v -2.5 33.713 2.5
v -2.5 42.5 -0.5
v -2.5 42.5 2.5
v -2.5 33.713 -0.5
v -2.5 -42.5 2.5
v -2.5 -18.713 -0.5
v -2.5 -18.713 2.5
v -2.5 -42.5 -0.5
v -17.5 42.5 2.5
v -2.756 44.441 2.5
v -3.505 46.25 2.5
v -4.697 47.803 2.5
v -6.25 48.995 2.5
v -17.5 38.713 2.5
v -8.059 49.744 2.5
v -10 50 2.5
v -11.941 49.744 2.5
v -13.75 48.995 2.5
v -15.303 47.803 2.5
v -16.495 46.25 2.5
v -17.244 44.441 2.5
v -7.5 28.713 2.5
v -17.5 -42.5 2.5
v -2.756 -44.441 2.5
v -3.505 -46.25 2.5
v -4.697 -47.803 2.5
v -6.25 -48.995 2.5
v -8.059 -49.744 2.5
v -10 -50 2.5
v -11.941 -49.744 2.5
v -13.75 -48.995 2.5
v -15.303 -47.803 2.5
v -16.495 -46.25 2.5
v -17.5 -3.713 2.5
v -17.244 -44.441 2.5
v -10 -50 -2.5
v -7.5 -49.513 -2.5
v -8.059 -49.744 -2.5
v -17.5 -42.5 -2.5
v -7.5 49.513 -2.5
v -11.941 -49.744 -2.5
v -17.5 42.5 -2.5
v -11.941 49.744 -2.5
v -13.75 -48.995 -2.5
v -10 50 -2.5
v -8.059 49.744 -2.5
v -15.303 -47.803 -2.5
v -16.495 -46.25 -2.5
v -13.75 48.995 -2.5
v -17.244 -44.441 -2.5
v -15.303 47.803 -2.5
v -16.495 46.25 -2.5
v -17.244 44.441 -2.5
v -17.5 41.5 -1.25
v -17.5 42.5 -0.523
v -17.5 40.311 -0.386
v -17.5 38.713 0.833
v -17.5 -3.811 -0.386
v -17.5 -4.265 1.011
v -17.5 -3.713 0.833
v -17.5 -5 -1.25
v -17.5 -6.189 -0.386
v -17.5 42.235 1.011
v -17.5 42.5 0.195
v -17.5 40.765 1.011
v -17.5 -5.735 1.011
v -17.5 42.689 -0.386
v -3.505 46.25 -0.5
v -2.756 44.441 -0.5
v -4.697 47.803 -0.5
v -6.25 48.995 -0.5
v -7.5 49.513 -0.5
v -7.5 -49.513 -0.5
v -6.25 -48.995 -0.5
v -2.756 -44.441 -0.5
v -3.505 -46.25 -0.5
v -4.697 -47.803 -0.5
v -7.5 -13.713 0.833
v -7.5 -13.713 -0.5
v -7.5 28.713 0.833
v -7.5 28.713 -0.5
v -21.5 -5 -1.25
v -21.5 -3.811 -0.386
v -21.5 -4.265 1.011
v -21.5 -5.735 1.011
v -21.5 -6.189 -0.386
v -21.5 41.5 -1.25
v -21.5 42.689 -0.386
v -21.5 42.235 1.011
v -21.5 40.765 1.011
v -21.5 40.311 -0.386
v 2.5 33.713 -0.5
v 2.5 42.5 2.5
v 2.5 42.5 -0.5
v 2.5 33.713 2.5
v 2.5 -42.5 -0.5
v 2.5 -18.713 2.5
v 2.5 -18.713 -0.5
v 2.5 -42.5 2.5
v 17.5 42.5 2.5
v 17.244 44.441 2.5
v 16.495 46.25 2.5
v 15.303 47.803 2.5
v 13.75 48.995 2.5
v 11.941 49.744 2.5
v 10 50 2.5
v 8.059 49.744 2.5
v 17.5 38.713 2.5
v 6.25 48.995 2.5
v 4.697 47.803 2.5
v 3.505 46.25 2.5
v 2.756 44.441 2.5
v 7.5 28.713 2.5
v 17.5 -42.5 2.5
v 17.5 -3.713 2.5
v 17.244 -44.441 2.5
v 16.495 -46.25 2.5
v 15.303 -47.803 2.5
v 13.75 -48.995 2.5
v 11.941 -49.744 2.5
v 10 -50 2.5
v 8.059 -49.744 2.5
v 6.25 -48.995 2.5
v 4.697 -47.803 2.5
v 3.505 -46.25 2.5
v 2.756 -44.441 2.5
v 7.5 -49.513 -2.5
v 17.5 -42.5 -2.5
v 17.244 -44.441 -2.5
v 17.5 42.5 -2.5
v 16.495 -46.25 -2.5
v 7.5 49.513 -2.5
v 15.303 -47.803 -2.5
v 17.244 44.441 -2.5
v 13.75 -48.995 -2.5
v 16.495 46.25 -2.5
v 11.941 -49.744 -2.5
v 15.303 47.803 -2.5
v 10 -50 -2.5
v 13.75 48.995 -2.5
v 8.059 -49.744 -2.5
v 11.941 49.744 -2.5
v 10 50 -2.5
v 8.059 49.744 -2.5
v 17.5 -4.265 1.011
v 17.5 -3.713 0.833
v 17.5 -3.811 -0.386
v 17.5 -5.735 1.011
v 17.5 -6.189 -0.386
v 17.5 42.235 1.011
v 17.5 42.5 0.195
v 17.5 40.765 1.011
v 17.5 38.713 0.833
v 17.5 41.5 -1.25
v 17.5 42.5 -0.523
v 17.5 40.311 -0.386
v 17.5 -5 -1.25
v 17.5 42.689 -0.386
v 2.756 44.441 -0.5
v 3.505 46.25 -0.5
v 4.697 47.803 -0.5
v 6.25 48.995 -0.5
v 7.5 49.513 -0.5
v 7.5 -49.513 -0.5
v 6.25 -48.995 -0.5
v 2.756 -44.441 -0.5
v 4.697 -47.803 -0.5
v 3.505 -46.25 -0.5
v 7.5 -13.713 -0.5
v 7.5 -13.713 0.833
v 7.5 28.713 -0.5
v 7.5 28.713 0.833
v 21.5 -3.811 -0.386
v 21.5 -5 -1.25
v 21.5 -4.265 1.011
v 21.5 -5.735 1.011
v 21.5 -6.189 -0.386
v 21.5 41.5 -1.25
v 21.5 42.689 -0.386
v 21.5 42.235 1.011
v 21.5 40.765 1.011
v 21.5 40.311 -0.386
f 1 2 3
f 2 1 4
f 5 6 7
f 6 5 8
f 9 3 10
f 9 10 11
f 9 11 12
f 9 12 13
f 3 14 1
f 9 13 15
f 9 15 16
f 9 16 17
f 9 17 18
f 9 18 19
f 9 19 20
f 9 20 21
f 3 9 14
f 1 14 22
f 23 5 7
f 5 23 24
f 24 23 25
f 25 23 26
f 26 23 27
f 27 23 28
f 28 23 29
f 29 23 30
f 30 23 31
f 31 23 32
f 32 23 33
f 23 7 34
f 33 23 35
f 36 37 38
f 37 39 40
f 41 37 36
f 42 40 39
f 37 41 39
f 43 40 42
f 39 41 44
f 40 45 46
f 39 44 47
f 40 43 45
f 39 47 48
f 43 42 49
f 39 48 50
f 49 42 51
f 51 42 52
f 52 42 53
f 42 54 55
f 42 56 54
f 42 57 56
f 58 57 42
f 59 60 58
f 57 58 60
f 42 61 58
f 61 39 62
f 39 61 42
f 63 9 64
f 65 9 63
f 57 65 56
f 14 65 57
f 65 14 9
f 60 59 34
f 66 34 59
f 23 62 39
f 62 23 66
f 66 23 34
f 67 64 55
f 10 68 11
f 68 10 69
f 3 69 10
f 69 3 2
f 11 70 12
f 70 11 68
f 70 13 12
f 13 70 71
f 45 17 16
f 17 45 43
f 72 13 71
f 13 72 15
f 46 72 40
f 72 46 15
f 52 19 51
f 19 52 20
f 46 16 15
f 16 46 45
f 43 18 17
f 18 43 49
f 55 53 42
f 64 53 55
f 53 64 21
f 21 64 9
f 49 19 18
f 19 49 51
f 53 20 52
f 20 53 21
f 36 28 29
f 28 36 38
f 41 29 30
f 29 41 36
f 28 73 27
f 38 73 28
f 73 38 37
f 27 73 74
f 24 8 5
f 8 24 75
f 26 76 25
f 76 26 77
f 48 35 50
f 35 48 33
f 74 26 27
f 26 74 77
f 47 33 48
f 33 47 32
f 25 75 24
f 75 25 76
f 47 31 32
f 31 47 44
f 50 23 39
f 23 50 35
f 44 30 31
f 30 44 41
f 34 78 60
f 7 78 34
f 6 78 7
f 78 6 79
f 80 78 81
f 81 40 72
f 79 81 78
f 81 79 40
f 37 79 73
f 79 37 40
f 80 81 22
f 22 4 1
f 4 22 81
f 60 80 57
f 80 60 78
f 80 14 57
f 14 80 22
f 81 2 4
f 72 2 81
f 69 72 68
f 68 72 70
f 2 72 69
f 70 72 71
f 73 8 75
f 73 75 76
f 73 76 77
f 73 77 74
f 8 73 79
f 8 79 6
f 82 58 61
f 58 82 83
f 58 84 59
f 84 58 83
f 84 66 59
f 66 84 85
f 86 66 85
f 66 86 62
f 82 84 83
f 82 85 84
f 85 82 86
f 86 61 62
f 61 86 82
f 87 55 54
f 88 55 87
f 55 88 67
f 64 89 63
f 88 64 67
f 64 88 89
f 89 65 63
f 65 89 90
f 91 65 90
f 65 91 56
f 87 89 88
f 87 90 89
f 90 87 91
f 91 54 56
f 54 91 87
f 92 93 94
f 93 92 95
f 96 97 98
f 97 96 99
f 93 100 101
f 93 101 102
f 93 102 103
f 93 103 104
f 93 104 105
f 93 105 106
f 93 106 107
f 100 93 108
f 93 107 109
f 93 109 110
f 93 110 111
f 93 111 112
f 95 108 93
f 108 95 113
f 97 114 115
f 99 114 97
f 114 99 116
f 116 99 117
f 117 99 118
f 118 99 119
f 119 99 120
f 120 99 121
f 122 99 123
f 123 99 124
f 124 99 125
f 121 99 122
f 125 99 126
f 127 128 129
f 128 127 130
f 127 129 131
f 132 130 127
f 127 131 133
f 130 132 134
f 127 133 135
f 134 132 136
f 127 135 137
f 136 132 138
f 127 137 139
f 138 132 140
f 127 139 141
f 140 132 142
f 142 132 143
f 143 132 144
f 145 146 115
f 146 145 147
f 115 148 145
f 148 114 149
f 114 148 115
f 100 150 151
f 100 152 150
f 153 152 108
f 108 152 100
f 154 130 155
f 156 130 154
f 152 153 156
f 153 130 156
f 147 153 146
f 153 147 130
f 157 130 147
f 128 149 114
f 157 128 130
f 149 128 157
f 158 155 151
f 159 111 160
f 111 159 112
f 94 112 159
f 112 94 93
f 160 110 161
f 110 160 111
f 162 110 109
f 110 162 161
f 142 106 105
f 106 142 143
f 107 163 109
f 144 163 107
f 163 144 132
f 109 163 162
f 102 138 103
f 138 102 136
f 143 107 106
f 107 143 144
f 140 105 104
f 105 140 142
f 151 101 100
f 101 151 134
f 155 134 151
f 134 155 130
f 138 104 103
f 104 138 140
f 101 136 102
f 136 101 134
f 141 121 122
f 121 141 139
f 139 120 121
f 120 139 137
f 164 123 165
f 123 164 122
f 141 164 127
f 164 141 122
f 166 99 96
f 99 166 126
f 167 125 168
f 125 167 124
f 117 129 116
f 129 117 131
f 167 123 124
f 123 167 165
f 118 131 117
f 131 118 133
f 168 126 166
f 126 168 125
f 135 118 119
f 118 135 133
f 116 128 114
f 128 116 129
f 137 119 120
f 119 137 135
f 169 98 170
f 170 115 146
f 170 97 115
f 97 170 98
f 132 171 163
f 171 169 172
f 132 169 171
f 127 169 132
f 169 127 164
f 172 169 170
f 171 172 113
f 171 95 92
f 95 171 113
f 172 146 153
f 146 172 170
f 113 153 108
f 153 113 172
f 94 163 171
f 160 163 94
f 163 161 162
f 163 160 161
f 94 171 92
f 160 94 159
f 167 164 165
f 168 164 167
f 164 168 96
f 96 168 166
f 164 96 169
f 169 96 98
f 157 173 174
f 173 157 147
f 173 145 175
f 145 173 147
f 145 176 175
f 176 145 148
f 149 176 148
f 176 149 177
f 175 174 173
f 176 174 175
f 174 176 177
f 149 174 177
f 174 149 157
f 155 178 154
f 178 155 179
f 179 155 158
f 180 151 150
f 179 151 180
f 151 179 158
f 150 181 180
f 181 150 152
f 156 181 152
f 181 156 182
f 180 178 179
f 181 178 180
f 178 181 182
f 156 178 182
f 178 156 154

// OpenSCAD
alto = 5;
ancho = 15;
largo = 100;
gap_papel_ancho = 5;
gap_papel_alto = 2;
ancho_regla = 30;

module puntera(diametro=10) {
  cylinder(h=alto, d=diametro, center = true);
};

module base() {
  largo_base = largo - ancho;
  color("red")
    cube([ancho, largo_base, alto], true);

  color("green")
    /* translate([- gap_papel_ancho / 2, largo_base / 2, 0]) */
    /*   puntera(diametro = ancho - gap_papel_ancho); */
    translate([0, largo_base / 2, 0]) 
    puntera(diametro = ancho);

  translate([0, -largo_base / 2, 0]) 
    puntera(diametro = ancho);
}


module portaRegla(adjust = 1) {
  color("blue")
    translate([0, 0, alto/3*2 * adjust])
    rotate([0, 0, -45])
    cube([80, ancho_regla, alto], true);
}

module guiaPapel() {
  // guia papel
  color("green")
    translate([ancho / 2 - gap_papel_ancho / 2, 0, alto / 2 - gap_papel_alto * 2])
    cube([gap_papel_ancho, largo, gap_papel_alto], true);
}

module gapRegla() {
  alto_gap_regla = largo;
  dx = ancho / 2 - gap_papel_ancho / 2;
  intersection() {
    portaRegla(adjust = 0);
    translate([dx, 0, 0])
      cube([gap_papel_ancho, alto_gap_regla, 30], true);
  }

  intersection() {
    translate([dx, 0, 0])
      cube([gap_papel_ancho, alto_gap_regla, 30], true);

    cubo_side = gap_papel_ancho * 2 * sin(45);
    cubo_dx = ancho / 2;
    cubo_dy = 30 * sin(45) - cubo_side * sin(45) / 2;
    color("purple")
      translate([cubo_dx, cubo_dy, 0])
      rotate([0, 0, -45])
      /* translate([-cubo_dx , 30 * tan(45), 0]) */
      cube([cubo_side, cubo_side, 20], true);
  }
}

module guia45() {
  difference() {
    base();
      guiaPapel();

    translate([0, 10, 0]) {
      portaRegla();
      gapRegla();
    }
  }

  ancho_peg = 4;
  translate([-ancho / 2 - ancho_peg / 2, -5, 0])
  rotate([0, 90, 0])
  cylinder(h=ancho_peg, d=2.5, center= true);

  translate([-ancho / 2 - ancho_peg / 2, largo / 2 - ancho / 2 - 1, 0])
  rotate([0, 90, 0])
  cylinder(h=ancho_peg, d=2.5, center= true);
}

translate([-10, 0, 0])
  guia45();

  translate([10, 0, 0])
mirror([1, 0, 0]) 
  guia45();
